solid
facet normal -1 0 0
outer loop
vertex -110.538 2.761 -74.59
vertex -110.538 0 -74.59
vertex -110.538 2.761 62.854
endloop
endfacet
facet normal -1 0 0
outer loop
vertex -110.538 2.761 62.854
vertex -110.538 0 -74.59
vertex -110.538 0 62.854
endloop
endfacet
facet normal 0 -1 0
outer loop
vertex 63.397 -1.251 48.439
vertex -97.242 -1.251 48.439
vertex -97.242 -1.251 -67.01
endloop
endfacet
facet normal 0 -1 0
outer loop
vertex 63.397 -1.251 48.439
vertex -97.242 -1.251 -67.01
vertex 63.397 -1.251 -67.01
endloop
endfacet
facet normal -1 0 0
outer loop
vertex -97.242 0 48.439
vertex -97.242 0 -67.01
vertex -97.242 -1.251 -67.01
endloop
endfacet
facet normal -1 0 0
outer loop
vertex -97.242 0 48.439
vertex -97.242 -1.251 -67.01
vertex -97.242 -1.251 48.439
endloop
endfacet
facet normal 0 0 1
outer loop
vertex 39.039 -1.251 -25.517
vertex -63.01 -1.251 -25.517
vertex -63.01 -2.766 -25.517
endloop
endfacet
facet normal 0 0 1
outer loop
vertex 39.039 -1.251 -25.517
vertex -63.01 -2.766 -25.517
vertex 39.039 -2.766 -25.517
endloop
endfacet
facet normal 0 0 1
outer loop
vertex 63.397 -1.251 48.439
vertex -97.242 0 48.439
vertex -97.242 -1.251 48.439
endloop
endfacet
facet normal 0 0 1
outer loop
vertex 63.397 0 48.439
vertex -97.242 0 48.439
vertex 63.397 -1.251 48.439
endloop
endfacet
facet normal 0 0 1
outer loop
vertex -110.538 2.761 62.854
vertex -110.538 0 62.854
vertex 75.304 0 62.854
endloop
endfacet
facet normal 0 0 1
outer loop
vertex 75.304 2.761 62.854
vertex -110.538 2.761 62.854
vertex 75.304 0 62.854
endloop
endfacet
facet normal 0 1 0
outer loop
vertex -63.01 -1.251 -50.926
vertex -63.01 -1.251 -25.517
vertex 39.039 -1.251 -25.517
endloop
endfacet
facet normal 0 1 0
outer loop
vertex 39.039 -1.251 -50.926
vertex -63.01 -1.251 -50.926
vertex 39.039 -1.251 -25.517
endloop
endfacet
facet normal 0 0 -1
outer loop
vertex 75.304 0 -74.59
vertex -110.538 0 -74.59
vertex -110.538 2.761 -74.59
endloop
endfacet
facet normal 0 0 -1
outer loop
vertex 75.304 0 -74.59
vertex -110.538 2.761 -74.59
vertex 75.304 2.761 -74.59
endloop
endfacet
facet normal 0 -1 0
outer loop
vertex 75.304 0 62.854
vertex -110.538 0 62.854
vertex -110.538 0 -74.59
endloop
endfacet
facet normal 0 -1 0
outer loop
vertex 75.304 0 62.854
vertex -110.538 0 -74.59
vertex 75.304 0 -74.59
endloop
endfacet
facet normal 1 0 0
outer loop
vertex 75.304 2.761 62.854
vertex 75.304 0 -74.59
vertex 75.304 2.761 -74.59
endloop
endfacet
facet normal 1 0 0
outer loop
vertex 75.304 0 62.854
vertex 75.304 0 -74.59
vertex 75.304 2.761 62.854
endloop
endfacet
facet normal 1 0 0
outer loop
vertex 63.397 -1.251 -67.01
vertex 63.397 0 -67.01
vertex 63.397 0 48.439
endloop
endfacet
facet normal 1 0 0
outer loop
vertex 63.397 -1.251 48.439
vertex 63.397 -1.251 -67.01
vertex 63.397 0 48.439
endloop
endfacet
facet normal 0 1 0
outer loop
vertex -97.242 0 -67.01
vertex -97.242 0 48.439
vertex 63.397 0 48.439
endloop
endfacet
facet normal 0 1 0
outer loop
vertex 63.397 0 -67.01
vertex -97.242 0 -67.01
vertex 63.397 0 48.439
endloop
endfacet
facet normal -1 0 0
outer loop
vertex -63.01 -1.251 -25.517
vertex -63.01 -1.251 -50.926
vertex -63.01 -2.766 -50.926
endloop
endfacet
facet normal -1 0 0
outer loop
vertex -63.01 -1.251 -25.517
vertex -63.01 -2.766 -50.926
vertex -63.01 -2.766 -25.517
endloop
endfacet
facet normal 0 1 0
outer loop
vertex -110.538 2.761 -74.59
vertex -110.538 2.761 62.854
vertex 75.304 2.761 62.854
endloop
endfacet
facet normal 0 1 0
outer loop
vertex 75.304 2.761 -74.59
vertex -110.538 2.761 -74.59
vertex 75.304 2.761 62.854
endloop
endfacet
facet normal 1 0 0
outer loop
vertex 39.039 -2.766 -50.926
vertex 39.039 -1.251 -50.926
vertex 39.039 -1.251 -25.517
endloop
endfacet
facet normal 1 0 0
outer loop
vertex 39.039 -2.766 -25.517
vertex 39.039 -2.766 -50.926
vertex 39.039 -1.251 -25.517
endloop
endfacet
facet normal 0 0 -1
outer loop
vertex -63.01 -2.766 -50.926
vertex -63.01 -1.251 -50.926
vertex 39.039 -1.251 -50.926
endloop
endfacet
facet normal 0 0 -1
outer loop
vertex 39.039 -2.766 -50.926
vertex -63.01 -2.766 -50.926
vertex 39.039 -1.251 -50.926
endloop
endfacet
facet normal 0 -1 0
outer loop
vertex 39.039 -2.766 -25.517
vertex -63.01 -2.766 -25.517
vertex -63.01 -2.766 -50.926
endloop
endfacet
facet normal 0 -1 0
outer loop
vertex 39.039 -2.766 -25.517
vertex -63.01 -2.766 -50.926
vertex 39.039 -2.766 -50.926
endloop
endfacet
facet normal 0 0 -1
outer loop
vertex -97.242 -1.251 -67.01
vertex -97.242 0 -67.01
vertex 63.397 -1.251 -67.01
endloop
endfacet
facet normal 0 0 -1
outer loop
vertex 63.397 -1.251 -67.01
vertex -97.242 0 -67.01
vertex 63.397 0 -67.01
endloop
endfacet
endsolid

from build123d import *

# Parameters (mm, degrees)
F2_W     = 185.8412176371
F2_H     = 137.4446004629
F3_DEPTH = 2.76111
F5_W     = 160.6390327215
F5_H     = 115.4496371746
F6_DEPTH = 1.25079
F7_W     = 102.049253881
F7_H     = 25.4090260714
F8_DEPTH = 1.51544


# Not quite as in the source:
# - the program builds the solid bodies; features that only make, move or delete a surface that nothing else refers to are left out


with BuildPart() as f3:
    # F2 (on Front) → F3 (new body)
    with BuildSketch(Plane.XZ):
        with Locations((-17.6170766354, -5.8681294322)):
            Rectangle(F2_W, F2_H)
    extrude(amount=-F3_DEPTH)


with BuildPart() as f6:
    # F5 (on face) → F6 (new body)
    with BuildSketch(Plane.XZ):
        with Locations((-16.9224664569, -9.2854946852)):
            Rectangle(F5_W, F5_H)
    extrude(amount=F6_DEPTH)


with BuildPart() as f8:
    # F7 (on face) → F8 (new body)
    with BuildSketch(Plane.XZ.offset(1.25079)):
        with Locations((-11.9856484234, -38.2217699662)):
            Rectangle(F7_W, F7_H)
    extrude(amount=F8_DEPTH)


solid = Compound([f3.part, f6.part, f8.part])
